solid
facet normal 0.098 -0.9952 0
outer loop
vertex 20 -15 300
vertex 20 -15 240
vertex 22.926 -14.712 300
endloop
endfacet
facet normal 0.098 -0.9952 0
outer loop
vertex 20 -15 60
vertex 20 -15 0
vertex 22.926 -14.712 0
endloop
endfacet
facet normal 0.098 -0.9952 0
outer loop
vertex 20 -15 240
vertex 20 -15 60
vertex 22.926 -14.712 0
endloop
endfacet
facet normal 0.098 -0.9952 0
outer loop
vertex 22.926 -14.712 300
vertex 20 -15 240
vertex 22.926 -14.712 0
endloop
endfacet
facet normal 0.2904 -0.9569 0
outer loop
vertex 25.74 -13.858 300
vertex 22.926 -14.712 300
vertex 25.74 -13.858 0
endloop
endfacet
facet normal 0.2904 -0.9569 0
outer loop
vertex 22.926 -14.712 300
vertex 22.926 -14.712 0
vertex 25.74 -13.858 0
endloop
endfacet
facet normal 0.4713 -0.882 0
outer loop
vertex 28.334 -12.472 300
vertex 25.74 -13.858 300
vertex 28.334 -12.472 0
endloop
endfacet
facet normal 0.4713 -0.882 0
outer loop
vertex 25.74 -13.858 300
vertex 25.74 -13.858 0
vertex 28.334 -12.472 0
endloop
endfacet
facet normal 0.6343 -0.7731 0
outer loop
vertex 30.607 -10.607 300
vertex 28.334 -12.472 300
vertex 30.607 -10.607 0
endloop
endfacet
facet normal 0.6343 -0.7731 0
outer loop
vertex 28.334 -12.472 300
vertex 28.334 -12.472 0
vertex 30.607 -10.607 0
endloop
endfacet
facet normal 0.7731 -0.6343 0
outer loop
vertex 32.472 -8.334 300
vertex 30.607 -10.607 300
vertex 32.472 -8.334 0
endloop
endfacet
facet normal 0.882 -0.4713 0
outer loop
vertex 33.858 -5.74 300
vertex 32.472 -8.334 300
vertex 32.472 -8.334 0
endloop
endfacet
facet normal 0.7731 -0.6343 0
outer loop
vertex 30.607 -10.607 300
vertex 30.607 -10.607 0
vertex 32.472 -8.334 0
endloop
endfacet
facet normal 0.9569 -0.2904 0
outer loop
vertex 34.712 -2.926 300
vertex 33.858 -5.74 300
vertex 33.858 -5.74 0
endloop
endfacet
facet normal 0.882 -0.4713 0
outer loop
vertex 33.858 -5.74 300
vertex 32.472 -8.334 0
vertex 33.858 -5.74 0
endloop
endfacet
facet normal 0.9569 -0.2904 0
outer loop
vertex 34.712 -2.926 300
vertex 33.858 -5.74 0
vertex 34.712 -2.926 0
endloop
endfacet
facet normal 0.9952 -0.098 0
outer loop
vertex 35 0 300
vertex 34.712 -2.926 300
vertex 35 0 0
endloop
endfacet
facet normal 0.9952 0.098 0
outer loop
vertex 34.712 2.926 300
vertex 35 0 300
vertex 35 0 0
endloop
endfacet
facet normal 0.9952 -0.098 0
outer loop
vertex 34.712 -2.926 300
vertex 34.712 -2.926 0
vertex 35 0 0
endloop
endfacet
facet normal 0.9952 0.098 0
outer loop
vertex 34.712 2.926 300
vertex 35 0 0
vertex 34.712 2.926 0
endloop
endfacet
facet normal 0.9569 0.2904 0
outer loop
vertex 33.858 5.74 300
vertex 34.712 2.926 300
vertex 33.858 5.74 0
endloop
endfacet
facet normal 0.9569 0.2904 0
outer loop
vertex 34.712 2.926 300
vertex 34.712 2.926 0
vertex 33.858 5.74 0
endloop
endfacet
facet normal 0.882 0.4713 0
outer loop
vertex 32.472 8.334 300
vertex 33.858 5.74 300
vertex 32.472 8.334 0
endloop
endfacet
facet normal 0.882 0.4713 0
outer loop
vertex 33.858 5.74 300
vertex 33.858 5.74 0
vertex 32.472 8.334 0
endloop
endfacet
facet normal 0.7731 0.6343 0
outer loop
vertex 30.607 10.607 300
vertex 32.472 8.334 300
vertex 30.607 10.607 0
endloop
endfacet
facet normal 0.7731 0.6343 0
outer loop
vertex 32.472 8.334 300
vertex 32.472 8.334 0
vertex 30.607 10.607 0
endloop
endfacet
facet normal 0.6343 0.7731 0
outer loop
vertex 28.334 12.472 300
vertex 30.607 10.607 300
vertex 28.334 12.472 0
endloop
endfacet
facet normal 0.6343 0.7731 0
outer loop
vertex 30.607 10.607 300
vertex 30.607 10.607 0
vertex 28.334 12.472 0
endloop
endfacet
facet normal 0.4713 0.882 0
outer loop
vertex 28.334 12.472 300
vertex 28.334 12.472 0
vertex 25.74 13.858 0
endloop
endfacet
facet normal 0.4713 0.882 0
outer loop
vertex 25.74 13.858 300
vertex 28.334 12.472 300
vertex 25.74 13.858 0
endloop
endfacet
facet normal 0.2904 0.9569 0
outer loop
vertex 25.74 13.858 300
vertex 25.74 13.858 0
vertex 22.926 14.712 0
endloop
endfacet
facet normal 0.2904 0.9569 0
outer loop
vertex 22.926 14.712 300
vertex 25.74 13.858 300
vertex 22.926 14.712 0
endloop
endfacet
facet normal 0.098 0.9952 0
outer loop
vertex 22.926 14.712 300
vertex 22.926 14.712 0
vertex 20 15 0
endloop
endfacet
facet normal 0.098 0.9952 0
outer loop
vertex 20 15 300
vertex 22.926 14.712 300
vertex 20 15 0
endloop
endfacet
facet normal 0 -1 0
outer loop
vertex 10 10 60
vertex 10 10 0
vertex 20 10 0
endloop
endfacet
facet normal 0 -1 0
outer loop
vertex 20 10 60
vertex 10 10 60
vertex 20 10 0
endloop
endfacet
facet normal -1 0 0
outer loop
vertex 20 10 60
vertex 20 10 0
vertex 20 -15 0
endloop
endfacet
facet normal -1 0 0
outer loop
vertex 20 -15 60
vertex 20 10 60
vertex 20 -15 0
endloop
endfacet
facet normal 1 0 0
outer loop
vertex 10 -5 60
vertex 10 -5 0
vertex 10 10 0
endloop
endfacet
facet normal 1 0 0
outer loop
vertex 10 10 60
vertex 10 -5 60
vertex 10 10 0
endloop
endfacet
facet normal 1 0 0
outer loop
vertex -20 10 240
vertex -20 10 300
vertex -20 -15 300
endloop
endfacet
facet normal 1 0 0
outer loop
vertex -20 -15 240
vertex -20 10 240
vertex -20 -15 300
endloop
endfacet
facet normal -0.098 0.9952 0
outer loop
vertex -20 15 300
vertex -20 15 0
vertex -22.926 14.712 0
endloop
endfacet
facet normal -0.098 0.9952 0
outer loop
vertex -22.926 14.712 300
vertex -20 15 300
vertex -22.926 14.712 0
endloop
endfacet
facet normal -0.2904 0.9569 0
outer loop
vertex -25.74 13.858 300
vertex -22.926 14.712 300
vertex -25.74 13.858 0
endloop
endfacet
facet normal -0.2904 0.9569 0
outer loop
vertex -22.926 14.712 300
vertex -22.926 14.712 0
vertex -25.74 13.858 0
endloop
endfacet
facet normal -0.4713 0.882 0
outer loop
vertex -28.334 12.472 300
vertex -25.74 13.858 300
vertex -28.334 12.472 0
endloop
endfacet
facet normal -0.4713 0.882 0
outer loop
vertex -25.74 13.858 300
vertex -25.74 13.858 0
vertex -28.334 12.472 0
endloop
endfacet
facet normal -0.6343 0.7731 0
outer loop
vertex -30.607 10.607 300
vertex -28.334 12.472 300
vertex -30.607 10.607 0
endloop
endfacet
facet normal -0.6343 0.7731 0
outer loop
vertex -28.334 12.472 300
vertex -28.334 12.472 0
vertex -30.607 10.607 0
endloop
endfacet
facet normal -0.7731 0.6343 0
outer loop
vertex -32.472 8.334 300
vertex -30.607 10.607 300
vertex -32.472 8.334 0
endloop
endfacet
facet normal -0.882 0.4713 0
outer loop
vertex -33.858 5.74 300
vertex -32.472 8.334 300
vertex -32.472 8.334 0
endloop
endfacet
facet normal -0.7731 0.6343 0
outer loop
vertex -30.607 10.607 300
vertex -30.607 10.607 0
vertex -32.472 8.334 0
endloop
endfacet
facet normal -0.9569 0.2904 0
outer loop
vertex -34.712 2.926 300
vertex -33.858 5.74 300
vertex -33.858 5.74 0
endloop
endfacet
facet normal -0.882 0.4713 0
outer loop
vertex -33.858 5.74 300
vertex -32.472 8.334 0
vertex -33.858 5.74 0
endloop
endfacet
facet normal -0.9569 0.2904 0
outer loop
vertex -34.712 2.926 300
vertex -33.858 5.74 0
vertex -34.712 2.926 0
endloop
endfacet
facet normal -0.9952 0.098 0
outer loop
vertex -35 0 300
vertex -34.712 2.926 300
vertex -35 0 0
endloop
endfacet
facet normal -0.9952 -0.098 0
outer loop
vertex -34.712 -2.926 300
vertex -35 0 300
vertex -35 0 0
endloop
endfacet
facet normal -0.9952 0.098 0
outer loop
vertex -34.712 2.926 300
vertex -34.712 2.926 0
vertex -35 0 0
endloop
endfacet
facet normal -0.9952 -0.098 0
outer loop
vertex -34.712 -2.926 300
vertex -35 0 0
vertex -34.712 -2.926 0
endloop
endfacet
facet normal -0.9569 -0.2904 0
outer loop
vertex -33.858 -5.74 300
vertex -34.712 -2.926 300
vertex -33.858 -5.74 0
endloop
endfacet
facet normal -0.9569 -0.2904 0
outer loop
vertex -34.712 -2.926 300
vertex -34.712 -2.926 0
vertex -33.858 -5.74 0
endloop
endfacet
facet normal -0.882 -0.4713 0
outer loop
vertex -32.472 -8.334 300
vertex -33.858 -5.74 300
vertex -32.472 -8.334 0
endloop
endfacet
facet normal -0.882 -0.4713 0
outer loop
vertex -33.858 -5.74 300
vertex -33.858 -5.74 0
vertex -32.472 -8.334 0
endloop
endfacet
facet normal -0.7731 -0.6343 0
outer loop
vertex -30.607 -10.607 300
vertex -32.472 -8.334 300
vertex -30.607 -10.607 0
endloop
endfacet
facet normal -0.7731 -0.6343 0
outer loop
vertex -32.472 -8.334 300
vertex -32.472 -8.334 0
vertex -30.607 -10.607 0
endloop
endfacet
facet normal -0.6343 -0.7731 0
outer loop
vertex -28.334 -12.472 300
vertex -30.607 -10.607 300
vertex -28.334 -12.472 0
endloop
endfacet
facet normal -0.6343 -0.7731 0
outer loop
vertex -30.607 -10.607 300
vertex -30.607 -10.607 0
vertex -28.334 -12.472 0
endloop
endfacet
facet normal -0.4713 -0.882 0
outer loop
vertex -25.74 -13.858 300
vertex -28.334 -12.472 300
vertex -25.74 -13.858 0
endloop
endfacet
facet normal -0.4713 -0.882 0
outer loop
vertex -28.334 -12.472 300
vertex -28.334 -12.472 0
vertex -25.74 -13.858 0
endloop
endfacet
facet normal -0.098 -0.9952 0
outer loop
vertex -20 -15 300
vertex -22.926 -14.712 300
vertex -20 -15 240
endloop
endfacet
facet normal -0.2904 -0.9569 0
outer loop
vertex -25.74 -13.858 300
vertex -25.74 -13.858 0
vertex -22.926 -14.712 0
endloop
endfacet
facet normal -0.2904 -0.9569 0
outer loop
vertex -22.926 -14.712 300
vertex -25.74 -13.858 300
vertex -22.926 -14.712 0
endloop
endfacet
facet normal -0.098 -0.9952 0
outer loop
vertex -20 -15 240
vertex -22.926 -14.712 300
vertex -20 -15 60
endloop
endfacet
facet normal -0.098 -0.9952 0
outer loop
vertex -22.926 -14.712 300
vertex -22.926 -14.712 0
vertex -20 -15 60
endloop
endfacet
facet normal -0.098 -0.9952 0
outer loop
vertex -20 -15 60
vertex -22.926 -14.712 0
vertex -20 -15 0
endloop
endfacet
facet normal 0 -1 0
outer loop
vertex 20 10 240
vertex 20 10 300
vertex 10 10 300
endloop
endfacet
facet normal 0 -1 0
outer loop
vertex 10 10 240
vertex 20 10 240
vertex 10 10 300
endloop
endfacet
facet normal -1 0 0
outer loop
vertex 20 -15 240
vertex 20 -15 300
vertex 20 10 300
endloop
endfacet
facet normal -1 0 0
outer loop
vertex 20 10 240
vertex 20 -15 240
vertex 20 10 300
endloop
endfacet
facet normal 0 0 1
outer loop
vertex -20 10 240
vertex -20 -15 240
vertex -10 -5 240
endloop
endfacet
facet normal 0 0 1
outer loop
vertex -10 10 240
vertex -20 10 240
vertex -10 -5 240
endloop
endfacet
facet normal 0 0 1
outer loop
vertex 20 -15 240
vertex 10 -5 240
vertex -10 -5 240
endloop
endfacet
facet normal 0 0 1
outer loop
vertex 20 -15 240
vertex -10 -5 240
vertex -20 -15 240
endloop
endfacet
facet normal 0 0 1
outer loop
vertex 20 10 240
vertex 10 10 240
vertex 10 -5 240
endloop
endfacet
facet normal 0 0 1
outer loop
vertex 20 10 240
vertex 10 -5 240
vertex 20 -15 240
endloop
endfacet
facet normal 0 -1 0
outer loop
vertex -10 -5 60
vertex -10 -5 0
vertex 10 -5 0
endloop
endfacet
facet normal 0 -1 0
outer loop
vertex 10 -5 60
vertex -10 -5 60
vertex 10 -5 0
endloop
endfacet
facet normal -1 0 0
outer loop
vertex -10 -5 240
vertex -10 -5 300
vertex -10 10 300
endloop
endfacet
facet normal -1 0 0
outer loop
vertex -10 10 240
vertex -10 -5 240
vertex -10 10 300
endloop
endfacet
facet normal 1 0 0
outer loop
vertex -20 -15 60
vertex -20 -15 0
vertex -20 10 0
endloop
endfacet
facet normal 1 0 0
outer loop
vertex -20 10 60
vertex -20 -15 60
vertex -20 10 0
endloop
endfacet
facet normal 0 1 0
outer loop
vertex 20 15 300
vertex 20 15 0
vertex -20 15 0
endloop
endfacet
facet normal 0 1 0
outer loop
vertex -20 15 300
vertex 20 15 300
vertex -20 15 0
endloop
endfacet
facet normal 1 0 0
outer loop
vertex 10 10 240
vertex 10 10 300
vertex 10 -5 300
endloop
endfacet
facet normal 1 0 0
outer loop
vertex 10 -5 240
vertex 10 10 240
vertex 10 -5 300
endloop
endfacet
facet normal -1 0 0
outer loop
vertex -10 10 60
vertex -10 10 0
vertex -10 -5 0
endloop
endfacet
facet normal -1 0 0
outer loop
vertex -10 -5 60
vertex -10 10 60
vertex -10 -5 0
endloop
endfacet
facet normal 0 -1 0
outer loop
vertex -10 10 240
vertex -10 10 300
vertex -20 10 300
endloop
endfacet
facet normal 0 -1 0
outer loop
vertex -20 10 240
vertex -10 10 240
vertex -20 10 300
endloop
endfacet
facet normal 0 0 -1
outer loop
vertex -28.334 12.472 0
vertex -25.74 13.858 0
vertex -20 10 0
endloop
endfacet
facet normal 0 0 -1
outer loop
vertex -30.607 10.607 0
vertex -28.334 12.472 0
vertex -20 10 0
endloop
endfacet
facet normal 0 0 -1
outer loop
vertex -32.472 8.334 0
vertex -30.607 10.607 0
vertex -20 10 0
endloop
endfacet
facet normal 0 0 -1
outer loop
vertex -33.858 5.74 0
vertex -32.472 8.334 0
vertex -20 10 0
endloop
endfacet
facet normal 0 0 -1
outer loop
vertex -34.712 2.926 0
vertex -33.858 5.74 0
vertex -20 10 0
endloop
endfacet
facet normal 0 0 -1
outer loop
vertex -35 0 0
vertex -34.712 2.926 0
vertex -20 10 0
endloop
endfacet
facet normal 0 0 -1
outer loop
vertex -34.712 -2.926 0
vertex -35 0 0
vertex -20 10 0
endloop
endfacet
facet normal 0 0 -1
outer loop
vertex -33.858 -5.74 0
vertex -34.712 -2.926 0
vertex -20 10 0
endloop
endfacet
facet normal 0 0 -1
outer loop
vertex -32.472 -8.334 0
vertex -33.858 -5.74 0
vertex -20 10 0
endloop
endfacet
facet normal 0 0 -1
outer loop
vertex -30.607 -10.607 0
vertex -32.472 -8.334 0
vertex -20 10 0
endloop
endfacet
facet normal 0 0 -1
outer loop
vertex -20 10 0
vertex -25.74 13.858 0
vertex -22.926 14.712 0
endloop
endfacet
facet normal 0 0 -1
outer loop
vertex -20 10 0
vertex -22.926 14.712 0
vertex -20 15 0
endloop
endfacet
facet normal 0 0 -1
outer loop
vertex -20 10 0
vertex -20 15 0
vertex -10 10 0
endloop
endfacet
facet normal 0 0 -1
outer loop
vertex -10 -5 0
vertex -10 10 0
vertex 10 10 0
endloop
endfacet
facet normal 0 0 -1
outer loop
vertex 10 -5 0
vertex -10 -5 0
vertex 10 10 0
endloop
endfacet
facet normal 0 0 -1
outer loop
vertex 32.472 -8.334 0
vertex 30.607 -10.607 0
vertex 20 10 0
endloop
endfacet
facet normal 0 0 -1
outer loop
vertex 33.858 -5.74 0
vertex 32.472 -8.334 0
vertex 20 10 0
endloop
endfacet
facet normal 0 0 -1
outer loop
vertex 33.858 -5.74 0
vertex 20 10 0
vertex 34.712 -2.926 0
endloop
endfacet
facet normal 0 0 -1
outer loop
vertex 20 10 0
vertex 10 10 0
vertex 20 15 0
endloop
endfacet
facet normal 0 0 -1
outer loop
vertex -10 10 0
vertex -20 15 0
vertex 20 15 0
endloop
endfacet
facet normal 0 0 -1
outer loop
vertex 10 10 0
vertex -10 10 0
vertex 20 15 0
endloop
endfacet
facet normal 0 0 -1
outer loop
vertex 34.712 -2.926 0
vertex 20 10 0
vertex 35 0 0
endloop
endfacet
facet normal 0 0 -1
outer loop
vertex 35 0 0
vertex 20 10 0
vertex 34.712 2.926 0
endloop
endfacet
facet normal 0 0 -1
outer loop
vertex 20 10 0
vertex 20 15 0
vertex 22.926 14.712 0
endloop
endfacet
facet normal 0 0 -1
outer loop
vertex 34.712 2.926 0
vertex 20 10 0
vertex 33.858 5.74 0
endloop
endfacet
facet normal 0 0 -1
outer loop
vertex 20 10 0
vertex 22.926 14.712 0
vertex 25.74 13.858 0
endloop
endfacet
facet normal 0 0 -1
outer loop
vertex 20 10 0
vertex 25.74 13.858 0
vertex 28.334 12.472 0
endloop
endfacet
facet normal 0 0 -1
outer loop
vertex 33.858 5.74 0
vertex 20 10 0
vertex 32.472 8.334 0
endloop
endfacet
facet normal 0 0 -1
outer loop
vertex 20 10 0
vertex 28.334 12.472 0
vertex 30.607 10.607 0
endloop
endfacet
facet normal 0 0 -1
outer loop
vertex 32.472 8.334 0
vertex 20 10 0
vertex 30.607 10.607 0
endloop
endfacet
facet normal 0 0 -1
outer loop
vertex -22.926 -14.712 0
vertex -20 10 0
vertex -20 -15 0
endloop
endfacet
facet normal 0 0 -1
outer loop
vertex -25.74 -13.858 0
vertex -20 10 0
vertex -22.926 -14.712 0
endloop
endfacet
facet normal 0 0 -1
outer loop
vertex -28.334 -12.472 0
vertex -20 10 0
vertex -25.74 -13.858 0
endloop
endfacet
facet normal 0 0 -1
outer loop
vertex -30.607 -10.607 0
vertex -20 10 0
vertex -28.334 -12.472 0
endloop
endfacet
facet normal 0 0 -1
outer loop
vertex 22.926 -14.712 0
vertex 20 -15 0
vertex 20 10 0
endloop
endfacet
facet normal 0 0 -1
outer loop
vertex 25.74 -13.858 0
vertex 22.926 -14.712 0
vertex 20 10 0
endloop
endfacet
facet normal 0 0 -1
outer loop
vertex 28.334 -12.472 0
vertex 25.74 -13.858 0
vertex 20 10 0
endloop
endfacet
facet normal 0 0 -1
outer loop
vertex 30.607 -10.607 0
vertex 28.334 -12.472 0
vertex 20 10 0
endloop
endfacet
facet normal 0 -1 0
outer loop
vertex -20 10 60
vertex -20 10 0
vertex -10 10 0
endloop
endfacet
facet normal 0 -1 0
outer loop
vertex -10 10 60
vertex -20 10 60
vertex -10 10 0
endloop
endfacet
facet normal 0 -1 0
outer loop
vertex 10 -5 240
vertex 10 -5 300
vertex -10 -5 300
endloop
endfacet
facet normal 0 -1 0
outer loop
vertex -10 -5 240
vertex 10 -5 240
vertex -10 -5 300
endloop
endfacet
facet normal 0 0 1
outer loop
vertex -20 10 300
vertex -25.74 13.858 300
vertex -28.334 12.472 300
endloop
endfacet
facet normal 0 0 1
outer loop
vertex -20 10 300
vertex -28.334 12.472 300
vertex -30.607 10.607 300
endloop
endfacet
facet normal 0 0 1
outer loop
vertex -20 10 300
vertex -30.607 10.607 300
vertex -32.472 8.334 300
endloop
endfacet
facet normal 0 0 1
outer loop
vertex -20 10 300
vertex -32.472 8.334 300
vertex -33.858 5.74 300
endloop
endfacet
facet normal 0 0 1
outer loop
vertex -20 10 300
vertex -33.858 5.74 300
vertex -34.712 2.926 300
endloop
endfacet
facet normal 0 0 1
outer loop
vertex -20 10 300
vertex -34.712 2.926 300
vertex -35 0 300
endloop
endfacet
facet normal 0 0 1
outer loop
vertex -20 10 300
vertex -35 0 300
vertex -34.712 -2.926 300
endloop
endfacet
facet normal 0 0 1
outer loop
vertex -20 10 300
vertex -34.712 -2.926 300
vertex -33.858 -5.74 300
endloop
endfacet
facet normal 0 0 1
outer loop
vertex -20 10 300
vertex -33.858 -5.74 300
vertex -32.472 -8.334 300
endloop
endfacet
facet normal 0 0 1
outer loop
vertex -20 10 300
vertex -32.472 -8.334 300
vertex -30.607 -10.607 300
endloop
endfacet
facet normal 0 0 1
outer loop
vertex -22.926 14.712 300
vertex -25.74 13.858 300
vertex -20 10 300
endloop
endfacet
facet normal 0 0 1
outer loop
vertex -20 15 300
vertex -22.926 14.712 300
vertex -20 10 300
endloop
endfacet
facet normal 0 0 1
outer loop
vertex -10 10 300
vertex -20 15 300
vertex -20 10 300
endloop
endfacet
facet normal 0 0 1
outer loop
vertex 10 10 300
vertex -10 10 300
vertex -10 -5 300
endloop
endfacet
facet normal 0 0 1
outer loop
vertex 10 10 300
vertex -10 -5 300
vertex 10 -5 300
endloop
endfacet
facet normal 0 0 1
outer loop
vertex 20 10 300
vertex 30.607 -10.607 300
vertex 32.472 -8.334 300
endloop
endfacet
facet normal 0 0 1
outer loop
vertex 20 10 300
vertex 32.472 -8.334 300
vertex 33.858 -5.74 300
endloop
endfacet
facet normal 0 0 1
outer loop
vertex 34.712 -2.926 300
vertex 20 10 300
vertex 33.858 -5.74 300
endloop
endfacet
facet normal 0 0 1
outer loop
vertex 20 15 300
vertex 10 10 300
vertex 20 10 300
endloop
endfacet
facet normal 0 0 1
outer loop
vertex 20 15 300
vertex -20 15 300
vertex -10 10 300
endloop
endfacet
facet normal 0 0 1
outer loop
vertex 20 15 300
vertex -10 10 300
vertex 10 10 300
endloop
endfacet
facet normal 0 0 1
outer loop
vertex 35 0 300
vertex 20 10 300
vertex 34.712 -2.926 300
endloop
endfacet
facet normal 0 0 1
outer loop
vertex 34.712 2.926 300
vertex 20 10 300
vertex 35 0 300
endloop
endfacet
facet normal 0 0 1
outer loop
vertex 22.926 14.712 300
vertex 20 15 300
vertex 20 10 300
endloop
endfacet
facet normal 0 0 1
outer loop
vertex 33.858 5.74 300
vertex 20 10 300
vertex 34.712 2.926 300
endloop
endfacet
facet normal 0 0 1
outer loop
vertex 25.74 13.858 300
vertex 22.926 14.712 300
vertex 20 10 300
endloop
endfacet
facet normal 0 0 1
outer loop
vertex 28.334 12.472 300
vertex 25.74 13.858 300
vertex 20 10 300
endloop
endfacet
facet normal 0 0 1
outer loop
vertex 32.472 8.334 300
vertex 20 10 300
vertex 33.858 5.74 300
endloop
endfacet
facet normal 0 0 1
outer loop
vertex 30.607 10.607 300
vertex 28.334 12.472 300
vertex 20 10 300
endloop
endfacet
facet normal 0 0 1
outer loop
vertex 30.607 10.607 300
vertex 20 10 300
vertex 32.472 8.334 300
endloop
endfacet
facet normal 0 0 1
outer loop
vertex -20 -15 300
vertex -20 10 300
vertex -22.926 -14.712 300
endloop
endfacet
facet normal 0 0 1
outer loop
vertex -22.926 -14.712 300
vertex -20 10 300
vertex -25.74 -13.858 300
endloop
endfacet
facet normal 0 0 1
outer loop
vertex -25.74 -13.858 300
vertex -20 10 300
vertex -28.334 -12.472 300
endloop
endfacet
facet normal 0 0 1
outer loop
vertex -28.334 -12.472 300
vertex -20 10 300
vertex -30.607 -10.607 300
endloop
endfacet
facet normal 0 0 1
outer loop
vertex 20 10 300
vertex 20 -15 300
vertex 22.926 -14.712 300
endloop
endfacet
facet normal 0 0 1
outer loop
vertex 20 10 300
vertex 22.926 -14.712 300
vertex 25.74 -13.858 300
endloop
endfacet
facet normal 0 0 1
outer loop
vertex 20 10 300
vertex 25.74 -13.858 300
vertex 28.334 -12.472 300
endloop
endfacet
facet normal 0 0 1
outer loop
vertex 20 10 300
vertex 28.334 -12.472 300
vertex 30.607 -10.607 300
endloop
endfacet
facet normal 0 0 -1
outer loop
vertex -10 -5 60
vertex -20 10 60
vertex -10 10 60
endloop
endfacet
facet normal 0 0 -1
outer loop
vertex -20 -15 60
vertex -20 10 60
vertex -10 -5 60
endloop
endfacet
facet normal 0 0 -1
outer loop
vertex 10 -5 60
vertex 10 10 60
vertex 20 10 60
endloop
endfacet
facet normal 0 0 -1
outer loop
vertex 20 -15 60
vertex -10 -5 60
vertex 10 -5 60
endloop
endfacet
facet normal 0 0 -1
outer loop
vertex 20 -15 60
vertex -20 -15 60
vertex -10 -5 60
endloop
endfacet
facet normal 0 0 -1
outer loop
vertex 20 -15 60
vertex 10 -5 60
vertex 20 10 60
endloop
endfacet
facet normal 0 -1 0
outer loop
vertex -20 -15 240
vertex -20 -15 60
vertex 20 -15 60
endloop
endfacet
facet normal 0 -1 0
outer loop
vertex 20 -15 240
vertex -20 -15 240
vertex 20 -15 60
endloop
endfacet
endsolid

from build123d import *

# Parameters (mm, degrees)
F1_DEPTH = 300
F3_DEPTH = 60
F5_DEPTH = 60


with BuildPart() as f1:
    # F0 (on Top) → F1 (new body)
    with BuildSketch(Plane.XY):
        with BuildLine():
            Line((20, 15), (0, 15))
            Line((0, 15), (-20, 15))
            ThreePointArc((-20, 15), (-35, 0), (-20, -15))
            Line((-20, -15), (0, -15))
            Line((0, -15), (20, -15))
            ThreePointArc((20, -15), (35, 0), (20, 15))
        make_face()
    extrude(amount=F1_DEPTH)

    # F2 (on face) → F3 (cut)
    with BuildSketch(Plane.XY.offset(300)):
        Polygon((-10, 10), (-20, 10), (-20, -18.429138), (0, -18.429138), (20, -18.429138), (20, 10), (10, 10), (10, -5), (0, -5), (-10, -5), align=None)
    extrude(amount=-F3_DEPTH, mode=Mode.SUBTRACT)

    # F4 (on face) → F5 (cut)
    with BuildSketch(Plane(origin=(0, 0, 0), x_dir=(1, 0, 0), z_dir=(0, 0, -1))):
        Polygon((10, -10), (20, -10), (20, 20.498224), (0, 20.498224), (-20, 20.498224), (-20, -10), (-10, -10), (-10, 5), (0, 5), (10, 5), align=None)
    extrude(amount=-F5_DEPTH, mode=Mode.SUBTRACT)


solid = f1.part
